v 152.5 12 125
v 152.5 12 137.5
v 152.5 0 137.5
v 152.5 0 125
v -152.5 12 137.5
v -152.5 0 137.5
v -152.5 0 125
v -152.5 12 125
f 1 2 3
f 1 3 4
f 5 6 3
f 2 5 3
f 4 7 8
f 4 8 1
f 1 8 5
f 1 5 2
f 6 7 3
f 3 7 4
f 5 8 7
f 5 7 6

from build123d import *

# Parameters (mm, degrees)
SKETCH1_W            = 330
SKETCH1_H            = 275
SKETCH1_W_2          = 305
SKETCH1_H_2          = 250
BOSS_EXTRUDE4_DEPTH  = 12
BOSS_EXTRUDE6_DEPTH  = 12.5
BOSS_EXTRUDE7_DEPTH  = 12.5
SKETCH6_R            = 15
SKETCH6_R_2          = 11
BOSS_EXTRUDE8_DEPTH  = 12.5
SKETCH7_R            = 11
CUT_EXTRUDE2_DEPTH   = 383.003996993
BOSS_EXTRUDE9_REACH  = 283.371
SKETCH8_W            = 12.5
SKETCH8_H            = 10
BOSS_EXTRUDE10_REACH = 283.371
SKETCH9_W            = 12.5
SKETCH9_H            = 10
SKETCH10_W           = 25
SKETCH10_H           = 25
BOSS_EXTRUDE11_DEPTH = 12.5
SKETCH13_W           = 298.504377872
SKETCH13_H           = 174.029548168
CUT_EXTRUDE4_DEPTH   = 12.5
SKETCH14_W           = 182.395956461
SKETCH14_H           = 93.31192128
CUT_EXTRUDE5_DEPTH   = 71.5
SKETCH15_W           = 335.295700941
SKETCH15_H           = 100.118716731
CUT_EXTRUDE6_DEPTH   = 12.5
SKETCH16_W           = 69.396880986
SKETCH16_H           = 36.294815257
CUT_EXTRUDE7_DEPTH   = 362.5


with BuildPart() as part:
    # Sketch1 → Boss-Extrude4 (new body)
    with BuildSketch(Plane(origin=(0, 0, 0), x_dir=(1, 0, 0), z_dir=(0, 1, 0))):
        Rectangle(SKETCH1_W, SKETCH1_H)
        Rectangle(SKETCH1_W_2, SKETCH1_H_2, mode=Mode.SUBTRACT)
    extrude(amount=BOSS_EXTRUDE4_DEPTH)

    # Sketch2 → Boss-Extrude6 (add)
    with BuildSketch(Plane(origin=(165, 0, 0), x_dir=(0, 0, -1), z_dir=(1, 0, 0))):
        Polygon((0, 152), (-137.5, 12), (-127.5, 12), (0, 141.818181818), (127.5, 12), (137.5, 12), align=None)
    extrude(amount=-BOSS_EXTRUDE6_DEPTH)

    # Sketch5 → Boss-Extrude7 (add)
    with BuildSketch(Plane.ZY.offset(165)):
        Polygon((0, 152), (-137.5, 12), (-127.5, 12), (0, 141.818181818), (127.5, 12), (137.5, 12), align=None)
    extrude(amount=-BOSS_EXTRUDE7_DEPTH)

    # Sketch6 → Boss-Extrude8 (add)
    with BuildSketch(Plane.ZY.offset(-152.5)):
        with Locations((0, 146.909090909)):
            Circle(SKETCH6_R)
        with Locations((0, 146.909090909)):
            Circle(SKETCH6_R_2, mode=Mode.SUBTRACT)
    extrude(amount=-BOSS_EXTRUDE8_DEPTH)

    # Sketch7 → Cut-Extrude2 (cut, through all)
    with BuildSketch(Plane.ZY.offset(-152.5)):
        with Locations((0, 146.909090909)):
            Circle(SKETCH7_R)
    extrude(amount=-CUT_EXTRUDE2_DEPTH, mode=Mode.SUBTRACT)

    # Boss-Extrude9: up to this plane
    boss_extrude9_end = Plane(origin=(0, 12, 0), z_dir=(0, -1, 0))
    # Sketch8 → Boss-Extrude9 (add, up to the surface)
    with BuildSketch(Plane(origin=(0, 69.631553319, 70.897581561), x_dir=(-1, 0, 0), z_dir=(0, -0.7007080148842544, -0.7134481606094221)), mode=Mode.PRIVATE) as boss_extrude9_sk1:
        with Locations((-158.75, 10.200513494)):
            Rectangle(SKETCH8_W, SKETCH8_H)
    boss_extrude9_tool1 = split(extrude(boss_extrude9_sk1.sketch, amount=BOSS_EXTRUDE9_REACH, mode=Mode.PRIVATE), bisect_by=boss_extrude9_end, keep=Keep.BOTH, mode=Mode.PRIVATE)
    add(boss_extrude9_tool1.solids().sort_by_distance((158.75, 76.909091, 63.75))[0])
    # Sketch8 → Boss-Extrude9 (add, up to the surface)
    with BuildSketch(Plane(origin=(0, 69.631553319, 70.897581561), x_dir=(-1, 0, 0), z_dir=(0, -0.7007080148842544, -0.7134481606094221)), mode=Mode.PRIVATE) as boss_extrude9_sk2:
        with Locations((158.75, 10.200513494)):
            Rectangle(SKETCH8_W, SKETCH8_H)
    boss_extrude9_tool2 = split(extrude(boss_extrude9_sk2.sketch, amount=BOSS_EXTRUDE9_REACH, mode=Mode.PRIVATE), bisect_by=boss_extrude9_end, keep=Keep.BOTH, mode=Mode.PRIVATE)
    add(boss_extrude9_tool2.solids().sort_by_distance((-158.75, 76.909091, 63.75))[0])

    # Boss-Extrude10: up to this plane
    boss_extrude10_end = Plane(origin=(0, 12, 0), z_dir=(0, -1, 0))
    # Sketch9 → Boss-Extrude10 (add, up to the surface)
    with BuildSketch(Plane(origin=(0, 69.631553319, -70.897581561), x_dir=(1, 0, 0), z_dir=(0, -0.7007080148842544, 0.7134481606094221)), mode=Mode.PRIVATE) as boss_extrude10_sk1:
        with Locations((-158.75, 10.200513494)):
            Rectangle(SKETCH9_W, SKETCH9_H)
    boss_extrude10_tool1 = split(extrude(boss_extrude10_sk1.sketch, amount=BOSS_EXTRUDE10_REACH, mode=Mode.PRIVATE), bisect_by=boss_extrude10_end, keep=Keep.BOTH, mode=Mode.PRIVATE)
    add(boss_extrude10_tool1.solids().sort_by_distance((-158.75, 76.909091, -63.75))[0])
    # Sketch9 → Boss-Extrude10 (add, up to the surface)
    with BuildSketch(Plane(origin=(0, 69.631553319, -70.897581561), x_dir=(1, 0, 0), z_dir=(0, -0.7007080148842544, 0.7134481606094221)), mode=Mode.PRIVATE) as boss_extrude10_sk2:
        with Locations((158.75, 10.200513494)):
            Rectangle(SKETCH9_W, SKETCH9_H)
    boss_extrude10_tool2 = split(extrude(boss_extrude10_sk2.sketch, amount=BOSS_EXTRUDE10_REACH, mode=Mode.PRIVATE), bisect_by=boss_extrude10_end, keep=Keep.BOTH, mode=Mode.PRIVATE)
    add(boss_extrude10_tool2.solids().sort_by_distance((158.75, 76.909091, -63.75))[0])

    # Sketch10 → Boss-Extrude11 (add)
    with BuildSketch(Plane(origin=(-152.5, 0, 0), x_dir=(0, 0, -1), z_dir=(1, 0, 0))):
        with Locations((0, 146.909090909)):
            Rectangle(SKETCH10_W, SKETCH10_H)
    extrude(amount=-BOSS_EXTRUDE11_DEPTH)

    # Sketch11 → Revolve1 (revolve)
    with BuildSketch(Plane.XY, mode=Mode.PRIVATE) as revolve1_sk:
        with BuildLine():
            Line((152.5, 157.909090909), (152.5, 161.909090909))
            ThreePointArc((152.5, 161.909090909), (149.508436085, 160.260408588), (146.516872171, 161.909090909))
            Line((146.516872171, 161.909090909), (146.516872171, 157.909090909))
            Line((146.516872171, 157.909090909), (152.5, 157.909090909))
        make_face()
    revolve(revolve1_sk.sketch.rotate(Axis((152.5, 146.909090909, 0), (-1, 0, 0)), 270), axis=Axis((152.5, 146.909090909, 0), (-1, 0, 0)))

    # Sketch13 → Cut-Extrude4 (cut)
    with BuildSketch(Plane.ZY.offset(165)):
        with Locations((11.752188936, 87.014774084)):
            Rectangle(SKETCH13_W, SKETCH13_H)
    extrude(amount=-CUT_EXTRUDE4_DEPTH, mode=Mode.SUBTRACT)

    # Sketch14 → Cut-Extrude5 (cut)
    with BuildSketch(Plane(origin=(165, 0, 0), x_dir=(0, 0, -1), z_dir=(1, 0, 0))):
        with Locations((23.675931825, 129.906240663)):
            Rectangle(SKETCH14_W, SKETCH14_H)
    extrude(amount=-CUT_EXTRUDE5_DEPTH, mode=Mode.SUBTRACT)

    # Sketch15 → Cut-Extrude6 (cut)
    with BuildSketch(Plane(origin=(165, 0, 0), x_dir=(0, 0, -1), z_dir=(1, 0, 0))):
        with Locations((30.147850471, 50.059358366)):
            Rectangle(SKETCH15_W, SKETCH15_H)
    extrude(amount=-CUT_EXTRUDE6_DEPTH, mode=Mode.SUBTRACT)


with BuildPart() as cut_extrude6_piece_1:
    # of the separate pieces the step leaves, piece 1, a body of its own (cut_extrude6_pieces)
    add(part.part.solids().sort_by_distance((-152.5, 0, 137.5))[0])


with BuildPart() as cut_extrude6_piece_2:
    # of the separate pieces the step leaves, piece 2, a body of its own (cut_extrude6_pieces)
    add(part.part.solids().sort_by_distance((152.5, 0, -125))[0])

    # Sketch16 → Cut-Extrude7 (cut)
    with BuildSketch(Plane(origin=(152.5, 0, 0), x_dir=(0, 0, -1), z_dir=(1, 0, 0))):
        with Locations((159.698440493, 18.147407629)):
            Rectangle(SKETCH16_W, SKETCH16_H)
    extrude(amount=-CUT_EXTRUDE7_DEPTH, mode=Mode.SUBTRACT)


solid = cut_extrude6_piece_1.part
